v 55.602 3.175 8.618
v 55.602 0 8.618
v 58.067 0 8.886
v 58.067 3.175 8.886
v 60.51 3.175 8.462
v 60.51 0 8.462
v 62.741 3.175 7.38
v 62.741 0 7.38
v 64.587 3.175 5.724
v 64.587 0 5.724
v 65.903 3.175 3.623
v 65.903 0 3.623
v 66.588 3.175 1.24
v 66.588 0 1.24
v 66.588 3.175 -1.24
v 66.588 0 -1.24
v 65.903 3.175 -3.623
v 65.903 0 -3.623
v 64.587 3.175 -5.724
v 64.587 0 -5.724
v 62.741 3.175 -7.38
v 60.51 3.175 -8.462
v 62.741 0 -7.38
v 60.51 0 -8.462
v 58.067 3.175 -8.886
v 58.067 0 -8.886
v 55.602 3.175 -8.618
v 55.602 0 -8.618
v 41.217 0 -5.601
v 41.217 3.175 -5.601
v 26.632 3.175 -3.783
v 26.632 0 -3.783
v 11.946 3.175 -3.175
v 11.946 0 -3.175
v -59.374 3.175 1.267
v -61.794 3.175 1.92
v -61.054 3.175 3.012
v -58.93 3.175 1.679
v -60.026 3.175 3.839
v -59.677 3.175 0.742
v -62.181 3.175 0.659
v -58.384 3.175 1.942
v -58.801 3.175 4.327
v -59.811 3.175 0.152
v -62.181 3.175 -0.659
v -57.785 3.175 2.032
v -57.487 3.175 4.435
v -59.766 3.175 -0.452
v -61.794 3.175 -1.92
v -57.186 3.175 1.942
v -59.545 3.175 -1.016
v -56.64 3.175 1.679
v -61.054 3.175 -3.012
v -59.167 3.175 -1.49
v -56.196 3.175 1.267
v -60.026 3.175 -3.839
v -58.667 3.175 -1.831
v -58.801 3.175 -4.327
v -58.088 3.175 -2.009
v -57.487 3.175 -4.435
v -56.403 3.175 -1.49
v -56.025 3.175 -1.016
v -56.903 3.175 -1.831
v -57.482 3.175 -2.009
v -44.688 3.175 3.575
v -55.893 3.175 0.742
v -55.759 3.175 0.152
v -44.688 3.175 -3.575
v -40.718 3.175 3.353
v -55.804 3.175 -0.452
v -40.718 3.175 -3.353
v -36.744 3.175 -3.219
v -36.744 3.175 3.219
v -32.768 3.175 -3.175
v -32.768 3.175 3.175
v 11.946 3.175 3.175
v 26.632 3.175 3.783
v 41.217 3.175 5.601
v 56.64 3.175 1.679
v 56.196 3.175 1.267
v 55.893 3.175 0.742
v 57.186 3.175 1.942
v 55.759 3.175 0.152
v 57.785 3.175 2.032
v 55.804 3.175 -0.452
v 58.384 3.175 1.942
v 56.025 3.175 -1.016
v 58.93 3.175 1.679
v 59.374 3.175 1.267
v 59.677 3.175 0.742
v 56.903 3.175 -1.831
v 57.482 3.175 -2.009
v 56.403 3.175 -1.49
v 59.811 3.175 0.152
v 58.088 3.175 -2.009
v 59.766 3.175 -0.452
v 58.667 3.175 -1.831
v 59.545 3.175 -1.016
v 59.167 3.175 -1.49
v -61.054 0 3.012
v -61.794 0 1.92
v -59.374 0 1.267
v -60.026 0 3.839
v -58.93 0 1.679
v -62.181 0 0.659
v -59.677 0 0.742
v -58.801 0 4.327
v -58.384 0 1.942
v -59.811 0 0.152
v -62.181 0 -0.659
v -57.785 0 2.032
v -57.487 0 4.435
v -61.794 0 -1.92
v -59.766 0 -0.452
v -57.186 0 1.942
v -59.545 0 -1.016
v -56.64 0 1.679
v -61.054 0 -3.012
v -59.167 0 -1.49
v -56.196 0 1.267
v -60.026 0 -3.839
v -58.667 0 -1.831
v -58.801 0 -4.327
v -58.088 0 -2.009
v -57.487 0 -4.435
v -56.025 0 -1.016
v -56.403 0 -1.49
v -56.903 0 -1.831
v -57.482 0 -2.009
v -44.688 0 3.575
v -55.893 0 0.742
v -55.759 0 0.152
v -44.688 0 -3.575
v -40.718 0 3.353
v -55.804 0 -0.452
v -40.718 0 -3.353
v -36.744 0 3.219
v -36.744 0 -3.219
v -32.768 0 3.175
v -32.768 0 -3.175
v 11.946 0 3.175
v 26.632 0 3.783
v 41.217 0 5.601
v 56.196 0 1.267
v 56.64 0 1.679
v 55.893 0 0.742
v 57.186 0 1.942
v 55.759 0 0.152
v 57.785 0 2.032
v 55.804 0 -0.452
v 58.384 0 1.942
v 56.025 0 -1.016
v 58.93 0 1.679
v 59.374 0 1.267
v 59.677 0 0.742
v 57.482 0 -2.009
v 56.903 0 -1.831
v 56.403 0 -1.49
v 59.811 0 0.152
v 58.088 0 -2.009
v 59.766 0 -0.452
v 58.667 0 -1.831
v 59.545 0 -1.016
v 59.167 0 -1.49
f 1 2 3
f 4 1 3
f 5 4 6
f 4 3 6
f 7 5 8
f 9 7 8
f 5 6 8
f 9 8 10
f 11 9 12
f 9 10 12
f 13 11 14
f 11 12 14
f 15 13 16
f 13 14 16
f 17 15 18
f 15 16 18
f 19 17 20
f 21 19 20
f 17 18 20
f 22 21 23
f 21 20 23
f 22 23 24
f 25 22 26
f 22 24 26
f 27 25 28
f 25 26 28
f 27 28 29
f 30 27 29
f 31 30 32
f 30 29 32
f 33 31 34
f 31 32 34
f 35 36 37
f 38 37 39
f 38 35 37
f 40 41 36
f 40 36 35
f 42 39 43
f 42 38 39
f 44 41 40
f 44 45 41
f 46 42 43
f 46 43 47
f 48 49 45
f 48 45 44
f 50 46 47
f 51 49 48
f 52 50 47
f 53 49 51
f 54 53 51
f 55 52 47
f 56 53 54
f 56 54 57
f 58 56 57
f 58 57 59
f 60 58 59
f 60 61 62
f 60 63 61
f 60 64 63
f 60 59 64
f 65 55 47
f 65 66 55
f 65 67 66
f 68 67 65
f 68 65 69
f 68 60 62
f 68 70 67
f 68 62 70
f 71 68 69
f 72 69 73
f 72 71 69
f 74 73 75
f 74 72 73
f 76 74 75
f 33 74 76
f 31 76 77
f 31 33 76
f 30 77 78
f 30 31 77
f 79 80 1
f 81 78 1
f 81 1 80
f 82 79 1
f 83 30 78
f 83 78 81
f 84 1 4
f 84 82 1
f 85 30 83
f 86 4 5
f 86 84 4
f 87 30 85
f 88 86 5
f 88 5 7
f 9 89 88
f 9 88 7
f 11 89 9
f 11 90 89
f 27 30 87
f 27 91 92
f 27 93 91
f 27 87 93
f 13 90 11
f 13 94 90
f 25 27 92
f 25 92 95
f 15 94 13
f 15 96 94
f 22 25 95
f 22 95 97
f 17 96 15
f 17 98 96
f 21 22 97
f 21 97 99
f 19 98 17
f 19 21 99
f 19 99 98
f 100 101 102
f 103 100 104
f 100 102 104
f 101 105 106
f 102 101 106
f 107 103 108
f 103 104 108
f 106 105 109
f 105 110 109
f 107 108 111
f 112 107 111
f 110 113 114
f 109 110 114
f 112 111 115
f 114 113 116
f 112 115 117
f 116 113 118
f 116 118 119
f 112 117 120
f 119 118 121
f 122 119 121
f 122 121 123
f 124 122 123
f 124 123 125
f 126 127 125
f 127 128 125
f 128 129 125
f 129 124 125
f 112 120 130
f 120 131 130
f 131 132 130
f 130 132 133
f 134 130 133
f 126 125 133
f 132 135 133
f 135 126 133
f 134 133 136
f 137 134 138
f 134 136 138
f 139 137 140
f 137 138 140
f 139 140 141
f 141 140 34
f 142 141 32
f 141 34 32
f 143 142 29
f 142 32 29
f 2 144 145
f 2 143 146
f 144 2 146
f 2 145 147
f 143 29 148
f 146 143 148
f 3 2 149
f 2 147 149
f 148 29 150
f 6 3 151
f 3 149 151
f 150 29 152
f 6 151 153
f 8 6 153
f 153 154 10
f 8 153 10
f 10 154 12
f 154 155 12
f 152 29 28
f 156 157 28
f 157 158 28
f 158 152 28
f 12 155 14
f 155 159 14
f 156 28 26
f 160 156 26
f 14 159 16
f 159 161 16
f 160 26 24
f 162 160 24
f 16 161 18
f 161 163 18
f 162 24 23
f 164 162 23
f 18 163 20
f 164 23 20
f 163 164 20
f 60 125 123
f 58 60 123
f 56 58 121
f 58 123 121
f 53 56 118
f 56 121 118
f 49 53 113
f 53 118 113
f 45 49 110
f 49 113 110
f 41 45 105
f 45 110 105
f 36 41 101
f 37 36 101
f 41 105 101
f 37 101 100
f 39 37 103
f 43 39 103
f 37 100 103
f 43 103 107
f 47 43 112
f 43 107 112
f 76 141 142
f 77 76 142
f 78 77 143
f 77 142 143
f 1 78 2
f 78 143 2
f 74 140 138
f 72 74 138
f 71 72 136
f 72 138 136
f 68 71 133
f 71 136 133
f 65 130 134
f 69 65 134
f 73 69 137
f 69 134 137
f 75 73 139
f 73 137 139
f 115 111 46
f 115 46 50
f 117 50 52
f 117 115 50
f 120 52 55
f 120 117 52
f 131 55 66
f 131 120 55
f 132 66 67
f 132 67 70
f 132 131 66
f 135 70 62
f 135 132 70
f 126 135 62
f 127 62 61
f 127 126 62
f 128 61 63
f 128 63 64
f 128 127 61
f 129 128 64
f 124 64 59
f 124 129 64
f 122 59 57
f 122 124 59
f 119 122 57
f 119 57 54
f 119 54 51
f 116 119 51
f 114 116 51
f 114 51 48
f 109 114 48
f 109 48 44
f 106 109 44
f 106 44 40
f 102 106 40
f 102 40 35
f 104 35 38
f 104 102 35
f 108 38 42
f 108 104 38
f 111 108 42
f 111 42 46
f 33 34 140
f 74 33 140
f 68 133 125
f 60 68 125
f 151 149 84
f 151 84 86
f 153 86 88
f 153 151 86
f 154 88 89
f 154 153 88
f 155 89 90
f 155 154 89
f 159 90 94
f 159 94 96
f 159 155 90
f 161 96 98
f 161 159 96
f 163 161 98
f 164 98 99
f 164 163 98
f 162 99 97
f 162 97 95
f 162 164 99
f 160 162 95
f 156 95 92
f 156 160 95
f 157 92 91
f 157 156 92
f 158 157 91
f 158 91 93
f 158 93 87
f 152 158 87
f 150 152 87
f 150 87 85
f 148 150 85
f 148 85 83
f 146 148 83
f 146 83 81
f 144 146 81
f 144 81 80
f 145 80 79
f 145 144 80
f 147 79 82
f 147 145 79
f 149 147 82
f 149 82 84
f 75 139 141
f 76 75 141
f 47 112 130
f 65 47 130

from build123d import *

# Parameters (mm, degrees)
SKETCH1_R           = 2.032
BOSS_EXTRUDE1_DEPTH = 3.175
FILLET2_DEPTH       = 3.175


with BuildPart() as part:
    # Sketch1 → Boss-Extrude1 (new body)
    with BuildSketch(Plane(origin=(0, 0, 0), x_dir=(1, 0, 0), z_dir=(0, 1, 0))):
        with BuildLine():
            Line((-38.735, -3.175), (38.735, -3.175))
            Line((38.735, -3.175), (55.045918919, -8.457513514))
            ThreePointArc((55.045918919, -8.457513514), (66.675, 0), (55.045918919, 8.457513514))
            Line((55.045918919, 8.457513514), (38.735, 3.175))
            Line((38.735, 3.175), (-38.735, 3.175))
            Line((-38.735, 3.175), (-57.486999924, 4.434999544))
            ThreePointArc((-57.486999924, 4.434999544), (-62.23, 0), (-57.486999924, -4.434999544))
            Line((-57.486999924, -4.434999544), (-38.735, -3.175))
        make_face()
        with Locations(Location((-57.785, 0, 0), (0, 0, 270))):
            Circle(SKETCH1_R, mode=Mode.SUBTRACT)
        with Locations(Location((57.785, 0, 0), (0, 0, 270))):
            Circle(SKETCH1_R, mode=Mode.SUBTRACT)
    extrude(amount=BOSS_EXTRUDE1_DEPTH)

    # Fillet2: read off the stored shape, not the designer's step
    # Fillet2 outline → Fillet2 (add)
    with BuildSketch(Plane(origin=(0, 0, 0), x_dir=(1, 0, 0), z_dir=(0, 1, 0))):
        with BuildLine():
            ThreePointArc((55.045918919, 8.457513514), (55.322751331, 8.542214672), (55.602194863, 8.617857143))
            ThreePointArc((55.602194863, 8.617857143), (33.943137383, 4.540961334), (11.946092127, 3.175))
            Line((11.946092127, 3.175), (38.735, 3.175))
            Line((38.735, 3.175), (55.045918919, 8.457513514))
        make_face()
        with BuildLine():
            ThreePointArc((-44.6882895, -3.575018243), (-38.731643046, -3.275032701), (-32.76828646, -3.175))
            Line((-32.76828646, -3.175), (-38.735, -3.175))
            Line((-38.735, -3.175), (-44.6882895, -3.575018243))
        make_face()
        with BuildLine():
            ThreePointArc((11.946092127, -3.175), (33.943137383, -4.540961334), (55.602194863, -8.617857143))
            ThreePointArc((55.602194863, -8.617857143), (55.322751331, -8.542214672), (55.045918919, -8.457513514))
            Line((55.045918919, -8.457513514), (38.735, -3.175))
            Line((38.735, -3.175), (11.946092127, -3.175))
        make_face()
        with BuildLine():
            Line((-38.735, 3.175), (-32.76828646, 3.175))
            ThreePointArc((-32.76828646, 3.175), (-38.731643046, 3.275032701), (-44.6882895, 3.575018243))
            Line((-44.6882895, 3.575018243), (-38.735, 3.175))
        make_face()
    extrude(amount=FILLET2_DEPTH)


solid = part.part
